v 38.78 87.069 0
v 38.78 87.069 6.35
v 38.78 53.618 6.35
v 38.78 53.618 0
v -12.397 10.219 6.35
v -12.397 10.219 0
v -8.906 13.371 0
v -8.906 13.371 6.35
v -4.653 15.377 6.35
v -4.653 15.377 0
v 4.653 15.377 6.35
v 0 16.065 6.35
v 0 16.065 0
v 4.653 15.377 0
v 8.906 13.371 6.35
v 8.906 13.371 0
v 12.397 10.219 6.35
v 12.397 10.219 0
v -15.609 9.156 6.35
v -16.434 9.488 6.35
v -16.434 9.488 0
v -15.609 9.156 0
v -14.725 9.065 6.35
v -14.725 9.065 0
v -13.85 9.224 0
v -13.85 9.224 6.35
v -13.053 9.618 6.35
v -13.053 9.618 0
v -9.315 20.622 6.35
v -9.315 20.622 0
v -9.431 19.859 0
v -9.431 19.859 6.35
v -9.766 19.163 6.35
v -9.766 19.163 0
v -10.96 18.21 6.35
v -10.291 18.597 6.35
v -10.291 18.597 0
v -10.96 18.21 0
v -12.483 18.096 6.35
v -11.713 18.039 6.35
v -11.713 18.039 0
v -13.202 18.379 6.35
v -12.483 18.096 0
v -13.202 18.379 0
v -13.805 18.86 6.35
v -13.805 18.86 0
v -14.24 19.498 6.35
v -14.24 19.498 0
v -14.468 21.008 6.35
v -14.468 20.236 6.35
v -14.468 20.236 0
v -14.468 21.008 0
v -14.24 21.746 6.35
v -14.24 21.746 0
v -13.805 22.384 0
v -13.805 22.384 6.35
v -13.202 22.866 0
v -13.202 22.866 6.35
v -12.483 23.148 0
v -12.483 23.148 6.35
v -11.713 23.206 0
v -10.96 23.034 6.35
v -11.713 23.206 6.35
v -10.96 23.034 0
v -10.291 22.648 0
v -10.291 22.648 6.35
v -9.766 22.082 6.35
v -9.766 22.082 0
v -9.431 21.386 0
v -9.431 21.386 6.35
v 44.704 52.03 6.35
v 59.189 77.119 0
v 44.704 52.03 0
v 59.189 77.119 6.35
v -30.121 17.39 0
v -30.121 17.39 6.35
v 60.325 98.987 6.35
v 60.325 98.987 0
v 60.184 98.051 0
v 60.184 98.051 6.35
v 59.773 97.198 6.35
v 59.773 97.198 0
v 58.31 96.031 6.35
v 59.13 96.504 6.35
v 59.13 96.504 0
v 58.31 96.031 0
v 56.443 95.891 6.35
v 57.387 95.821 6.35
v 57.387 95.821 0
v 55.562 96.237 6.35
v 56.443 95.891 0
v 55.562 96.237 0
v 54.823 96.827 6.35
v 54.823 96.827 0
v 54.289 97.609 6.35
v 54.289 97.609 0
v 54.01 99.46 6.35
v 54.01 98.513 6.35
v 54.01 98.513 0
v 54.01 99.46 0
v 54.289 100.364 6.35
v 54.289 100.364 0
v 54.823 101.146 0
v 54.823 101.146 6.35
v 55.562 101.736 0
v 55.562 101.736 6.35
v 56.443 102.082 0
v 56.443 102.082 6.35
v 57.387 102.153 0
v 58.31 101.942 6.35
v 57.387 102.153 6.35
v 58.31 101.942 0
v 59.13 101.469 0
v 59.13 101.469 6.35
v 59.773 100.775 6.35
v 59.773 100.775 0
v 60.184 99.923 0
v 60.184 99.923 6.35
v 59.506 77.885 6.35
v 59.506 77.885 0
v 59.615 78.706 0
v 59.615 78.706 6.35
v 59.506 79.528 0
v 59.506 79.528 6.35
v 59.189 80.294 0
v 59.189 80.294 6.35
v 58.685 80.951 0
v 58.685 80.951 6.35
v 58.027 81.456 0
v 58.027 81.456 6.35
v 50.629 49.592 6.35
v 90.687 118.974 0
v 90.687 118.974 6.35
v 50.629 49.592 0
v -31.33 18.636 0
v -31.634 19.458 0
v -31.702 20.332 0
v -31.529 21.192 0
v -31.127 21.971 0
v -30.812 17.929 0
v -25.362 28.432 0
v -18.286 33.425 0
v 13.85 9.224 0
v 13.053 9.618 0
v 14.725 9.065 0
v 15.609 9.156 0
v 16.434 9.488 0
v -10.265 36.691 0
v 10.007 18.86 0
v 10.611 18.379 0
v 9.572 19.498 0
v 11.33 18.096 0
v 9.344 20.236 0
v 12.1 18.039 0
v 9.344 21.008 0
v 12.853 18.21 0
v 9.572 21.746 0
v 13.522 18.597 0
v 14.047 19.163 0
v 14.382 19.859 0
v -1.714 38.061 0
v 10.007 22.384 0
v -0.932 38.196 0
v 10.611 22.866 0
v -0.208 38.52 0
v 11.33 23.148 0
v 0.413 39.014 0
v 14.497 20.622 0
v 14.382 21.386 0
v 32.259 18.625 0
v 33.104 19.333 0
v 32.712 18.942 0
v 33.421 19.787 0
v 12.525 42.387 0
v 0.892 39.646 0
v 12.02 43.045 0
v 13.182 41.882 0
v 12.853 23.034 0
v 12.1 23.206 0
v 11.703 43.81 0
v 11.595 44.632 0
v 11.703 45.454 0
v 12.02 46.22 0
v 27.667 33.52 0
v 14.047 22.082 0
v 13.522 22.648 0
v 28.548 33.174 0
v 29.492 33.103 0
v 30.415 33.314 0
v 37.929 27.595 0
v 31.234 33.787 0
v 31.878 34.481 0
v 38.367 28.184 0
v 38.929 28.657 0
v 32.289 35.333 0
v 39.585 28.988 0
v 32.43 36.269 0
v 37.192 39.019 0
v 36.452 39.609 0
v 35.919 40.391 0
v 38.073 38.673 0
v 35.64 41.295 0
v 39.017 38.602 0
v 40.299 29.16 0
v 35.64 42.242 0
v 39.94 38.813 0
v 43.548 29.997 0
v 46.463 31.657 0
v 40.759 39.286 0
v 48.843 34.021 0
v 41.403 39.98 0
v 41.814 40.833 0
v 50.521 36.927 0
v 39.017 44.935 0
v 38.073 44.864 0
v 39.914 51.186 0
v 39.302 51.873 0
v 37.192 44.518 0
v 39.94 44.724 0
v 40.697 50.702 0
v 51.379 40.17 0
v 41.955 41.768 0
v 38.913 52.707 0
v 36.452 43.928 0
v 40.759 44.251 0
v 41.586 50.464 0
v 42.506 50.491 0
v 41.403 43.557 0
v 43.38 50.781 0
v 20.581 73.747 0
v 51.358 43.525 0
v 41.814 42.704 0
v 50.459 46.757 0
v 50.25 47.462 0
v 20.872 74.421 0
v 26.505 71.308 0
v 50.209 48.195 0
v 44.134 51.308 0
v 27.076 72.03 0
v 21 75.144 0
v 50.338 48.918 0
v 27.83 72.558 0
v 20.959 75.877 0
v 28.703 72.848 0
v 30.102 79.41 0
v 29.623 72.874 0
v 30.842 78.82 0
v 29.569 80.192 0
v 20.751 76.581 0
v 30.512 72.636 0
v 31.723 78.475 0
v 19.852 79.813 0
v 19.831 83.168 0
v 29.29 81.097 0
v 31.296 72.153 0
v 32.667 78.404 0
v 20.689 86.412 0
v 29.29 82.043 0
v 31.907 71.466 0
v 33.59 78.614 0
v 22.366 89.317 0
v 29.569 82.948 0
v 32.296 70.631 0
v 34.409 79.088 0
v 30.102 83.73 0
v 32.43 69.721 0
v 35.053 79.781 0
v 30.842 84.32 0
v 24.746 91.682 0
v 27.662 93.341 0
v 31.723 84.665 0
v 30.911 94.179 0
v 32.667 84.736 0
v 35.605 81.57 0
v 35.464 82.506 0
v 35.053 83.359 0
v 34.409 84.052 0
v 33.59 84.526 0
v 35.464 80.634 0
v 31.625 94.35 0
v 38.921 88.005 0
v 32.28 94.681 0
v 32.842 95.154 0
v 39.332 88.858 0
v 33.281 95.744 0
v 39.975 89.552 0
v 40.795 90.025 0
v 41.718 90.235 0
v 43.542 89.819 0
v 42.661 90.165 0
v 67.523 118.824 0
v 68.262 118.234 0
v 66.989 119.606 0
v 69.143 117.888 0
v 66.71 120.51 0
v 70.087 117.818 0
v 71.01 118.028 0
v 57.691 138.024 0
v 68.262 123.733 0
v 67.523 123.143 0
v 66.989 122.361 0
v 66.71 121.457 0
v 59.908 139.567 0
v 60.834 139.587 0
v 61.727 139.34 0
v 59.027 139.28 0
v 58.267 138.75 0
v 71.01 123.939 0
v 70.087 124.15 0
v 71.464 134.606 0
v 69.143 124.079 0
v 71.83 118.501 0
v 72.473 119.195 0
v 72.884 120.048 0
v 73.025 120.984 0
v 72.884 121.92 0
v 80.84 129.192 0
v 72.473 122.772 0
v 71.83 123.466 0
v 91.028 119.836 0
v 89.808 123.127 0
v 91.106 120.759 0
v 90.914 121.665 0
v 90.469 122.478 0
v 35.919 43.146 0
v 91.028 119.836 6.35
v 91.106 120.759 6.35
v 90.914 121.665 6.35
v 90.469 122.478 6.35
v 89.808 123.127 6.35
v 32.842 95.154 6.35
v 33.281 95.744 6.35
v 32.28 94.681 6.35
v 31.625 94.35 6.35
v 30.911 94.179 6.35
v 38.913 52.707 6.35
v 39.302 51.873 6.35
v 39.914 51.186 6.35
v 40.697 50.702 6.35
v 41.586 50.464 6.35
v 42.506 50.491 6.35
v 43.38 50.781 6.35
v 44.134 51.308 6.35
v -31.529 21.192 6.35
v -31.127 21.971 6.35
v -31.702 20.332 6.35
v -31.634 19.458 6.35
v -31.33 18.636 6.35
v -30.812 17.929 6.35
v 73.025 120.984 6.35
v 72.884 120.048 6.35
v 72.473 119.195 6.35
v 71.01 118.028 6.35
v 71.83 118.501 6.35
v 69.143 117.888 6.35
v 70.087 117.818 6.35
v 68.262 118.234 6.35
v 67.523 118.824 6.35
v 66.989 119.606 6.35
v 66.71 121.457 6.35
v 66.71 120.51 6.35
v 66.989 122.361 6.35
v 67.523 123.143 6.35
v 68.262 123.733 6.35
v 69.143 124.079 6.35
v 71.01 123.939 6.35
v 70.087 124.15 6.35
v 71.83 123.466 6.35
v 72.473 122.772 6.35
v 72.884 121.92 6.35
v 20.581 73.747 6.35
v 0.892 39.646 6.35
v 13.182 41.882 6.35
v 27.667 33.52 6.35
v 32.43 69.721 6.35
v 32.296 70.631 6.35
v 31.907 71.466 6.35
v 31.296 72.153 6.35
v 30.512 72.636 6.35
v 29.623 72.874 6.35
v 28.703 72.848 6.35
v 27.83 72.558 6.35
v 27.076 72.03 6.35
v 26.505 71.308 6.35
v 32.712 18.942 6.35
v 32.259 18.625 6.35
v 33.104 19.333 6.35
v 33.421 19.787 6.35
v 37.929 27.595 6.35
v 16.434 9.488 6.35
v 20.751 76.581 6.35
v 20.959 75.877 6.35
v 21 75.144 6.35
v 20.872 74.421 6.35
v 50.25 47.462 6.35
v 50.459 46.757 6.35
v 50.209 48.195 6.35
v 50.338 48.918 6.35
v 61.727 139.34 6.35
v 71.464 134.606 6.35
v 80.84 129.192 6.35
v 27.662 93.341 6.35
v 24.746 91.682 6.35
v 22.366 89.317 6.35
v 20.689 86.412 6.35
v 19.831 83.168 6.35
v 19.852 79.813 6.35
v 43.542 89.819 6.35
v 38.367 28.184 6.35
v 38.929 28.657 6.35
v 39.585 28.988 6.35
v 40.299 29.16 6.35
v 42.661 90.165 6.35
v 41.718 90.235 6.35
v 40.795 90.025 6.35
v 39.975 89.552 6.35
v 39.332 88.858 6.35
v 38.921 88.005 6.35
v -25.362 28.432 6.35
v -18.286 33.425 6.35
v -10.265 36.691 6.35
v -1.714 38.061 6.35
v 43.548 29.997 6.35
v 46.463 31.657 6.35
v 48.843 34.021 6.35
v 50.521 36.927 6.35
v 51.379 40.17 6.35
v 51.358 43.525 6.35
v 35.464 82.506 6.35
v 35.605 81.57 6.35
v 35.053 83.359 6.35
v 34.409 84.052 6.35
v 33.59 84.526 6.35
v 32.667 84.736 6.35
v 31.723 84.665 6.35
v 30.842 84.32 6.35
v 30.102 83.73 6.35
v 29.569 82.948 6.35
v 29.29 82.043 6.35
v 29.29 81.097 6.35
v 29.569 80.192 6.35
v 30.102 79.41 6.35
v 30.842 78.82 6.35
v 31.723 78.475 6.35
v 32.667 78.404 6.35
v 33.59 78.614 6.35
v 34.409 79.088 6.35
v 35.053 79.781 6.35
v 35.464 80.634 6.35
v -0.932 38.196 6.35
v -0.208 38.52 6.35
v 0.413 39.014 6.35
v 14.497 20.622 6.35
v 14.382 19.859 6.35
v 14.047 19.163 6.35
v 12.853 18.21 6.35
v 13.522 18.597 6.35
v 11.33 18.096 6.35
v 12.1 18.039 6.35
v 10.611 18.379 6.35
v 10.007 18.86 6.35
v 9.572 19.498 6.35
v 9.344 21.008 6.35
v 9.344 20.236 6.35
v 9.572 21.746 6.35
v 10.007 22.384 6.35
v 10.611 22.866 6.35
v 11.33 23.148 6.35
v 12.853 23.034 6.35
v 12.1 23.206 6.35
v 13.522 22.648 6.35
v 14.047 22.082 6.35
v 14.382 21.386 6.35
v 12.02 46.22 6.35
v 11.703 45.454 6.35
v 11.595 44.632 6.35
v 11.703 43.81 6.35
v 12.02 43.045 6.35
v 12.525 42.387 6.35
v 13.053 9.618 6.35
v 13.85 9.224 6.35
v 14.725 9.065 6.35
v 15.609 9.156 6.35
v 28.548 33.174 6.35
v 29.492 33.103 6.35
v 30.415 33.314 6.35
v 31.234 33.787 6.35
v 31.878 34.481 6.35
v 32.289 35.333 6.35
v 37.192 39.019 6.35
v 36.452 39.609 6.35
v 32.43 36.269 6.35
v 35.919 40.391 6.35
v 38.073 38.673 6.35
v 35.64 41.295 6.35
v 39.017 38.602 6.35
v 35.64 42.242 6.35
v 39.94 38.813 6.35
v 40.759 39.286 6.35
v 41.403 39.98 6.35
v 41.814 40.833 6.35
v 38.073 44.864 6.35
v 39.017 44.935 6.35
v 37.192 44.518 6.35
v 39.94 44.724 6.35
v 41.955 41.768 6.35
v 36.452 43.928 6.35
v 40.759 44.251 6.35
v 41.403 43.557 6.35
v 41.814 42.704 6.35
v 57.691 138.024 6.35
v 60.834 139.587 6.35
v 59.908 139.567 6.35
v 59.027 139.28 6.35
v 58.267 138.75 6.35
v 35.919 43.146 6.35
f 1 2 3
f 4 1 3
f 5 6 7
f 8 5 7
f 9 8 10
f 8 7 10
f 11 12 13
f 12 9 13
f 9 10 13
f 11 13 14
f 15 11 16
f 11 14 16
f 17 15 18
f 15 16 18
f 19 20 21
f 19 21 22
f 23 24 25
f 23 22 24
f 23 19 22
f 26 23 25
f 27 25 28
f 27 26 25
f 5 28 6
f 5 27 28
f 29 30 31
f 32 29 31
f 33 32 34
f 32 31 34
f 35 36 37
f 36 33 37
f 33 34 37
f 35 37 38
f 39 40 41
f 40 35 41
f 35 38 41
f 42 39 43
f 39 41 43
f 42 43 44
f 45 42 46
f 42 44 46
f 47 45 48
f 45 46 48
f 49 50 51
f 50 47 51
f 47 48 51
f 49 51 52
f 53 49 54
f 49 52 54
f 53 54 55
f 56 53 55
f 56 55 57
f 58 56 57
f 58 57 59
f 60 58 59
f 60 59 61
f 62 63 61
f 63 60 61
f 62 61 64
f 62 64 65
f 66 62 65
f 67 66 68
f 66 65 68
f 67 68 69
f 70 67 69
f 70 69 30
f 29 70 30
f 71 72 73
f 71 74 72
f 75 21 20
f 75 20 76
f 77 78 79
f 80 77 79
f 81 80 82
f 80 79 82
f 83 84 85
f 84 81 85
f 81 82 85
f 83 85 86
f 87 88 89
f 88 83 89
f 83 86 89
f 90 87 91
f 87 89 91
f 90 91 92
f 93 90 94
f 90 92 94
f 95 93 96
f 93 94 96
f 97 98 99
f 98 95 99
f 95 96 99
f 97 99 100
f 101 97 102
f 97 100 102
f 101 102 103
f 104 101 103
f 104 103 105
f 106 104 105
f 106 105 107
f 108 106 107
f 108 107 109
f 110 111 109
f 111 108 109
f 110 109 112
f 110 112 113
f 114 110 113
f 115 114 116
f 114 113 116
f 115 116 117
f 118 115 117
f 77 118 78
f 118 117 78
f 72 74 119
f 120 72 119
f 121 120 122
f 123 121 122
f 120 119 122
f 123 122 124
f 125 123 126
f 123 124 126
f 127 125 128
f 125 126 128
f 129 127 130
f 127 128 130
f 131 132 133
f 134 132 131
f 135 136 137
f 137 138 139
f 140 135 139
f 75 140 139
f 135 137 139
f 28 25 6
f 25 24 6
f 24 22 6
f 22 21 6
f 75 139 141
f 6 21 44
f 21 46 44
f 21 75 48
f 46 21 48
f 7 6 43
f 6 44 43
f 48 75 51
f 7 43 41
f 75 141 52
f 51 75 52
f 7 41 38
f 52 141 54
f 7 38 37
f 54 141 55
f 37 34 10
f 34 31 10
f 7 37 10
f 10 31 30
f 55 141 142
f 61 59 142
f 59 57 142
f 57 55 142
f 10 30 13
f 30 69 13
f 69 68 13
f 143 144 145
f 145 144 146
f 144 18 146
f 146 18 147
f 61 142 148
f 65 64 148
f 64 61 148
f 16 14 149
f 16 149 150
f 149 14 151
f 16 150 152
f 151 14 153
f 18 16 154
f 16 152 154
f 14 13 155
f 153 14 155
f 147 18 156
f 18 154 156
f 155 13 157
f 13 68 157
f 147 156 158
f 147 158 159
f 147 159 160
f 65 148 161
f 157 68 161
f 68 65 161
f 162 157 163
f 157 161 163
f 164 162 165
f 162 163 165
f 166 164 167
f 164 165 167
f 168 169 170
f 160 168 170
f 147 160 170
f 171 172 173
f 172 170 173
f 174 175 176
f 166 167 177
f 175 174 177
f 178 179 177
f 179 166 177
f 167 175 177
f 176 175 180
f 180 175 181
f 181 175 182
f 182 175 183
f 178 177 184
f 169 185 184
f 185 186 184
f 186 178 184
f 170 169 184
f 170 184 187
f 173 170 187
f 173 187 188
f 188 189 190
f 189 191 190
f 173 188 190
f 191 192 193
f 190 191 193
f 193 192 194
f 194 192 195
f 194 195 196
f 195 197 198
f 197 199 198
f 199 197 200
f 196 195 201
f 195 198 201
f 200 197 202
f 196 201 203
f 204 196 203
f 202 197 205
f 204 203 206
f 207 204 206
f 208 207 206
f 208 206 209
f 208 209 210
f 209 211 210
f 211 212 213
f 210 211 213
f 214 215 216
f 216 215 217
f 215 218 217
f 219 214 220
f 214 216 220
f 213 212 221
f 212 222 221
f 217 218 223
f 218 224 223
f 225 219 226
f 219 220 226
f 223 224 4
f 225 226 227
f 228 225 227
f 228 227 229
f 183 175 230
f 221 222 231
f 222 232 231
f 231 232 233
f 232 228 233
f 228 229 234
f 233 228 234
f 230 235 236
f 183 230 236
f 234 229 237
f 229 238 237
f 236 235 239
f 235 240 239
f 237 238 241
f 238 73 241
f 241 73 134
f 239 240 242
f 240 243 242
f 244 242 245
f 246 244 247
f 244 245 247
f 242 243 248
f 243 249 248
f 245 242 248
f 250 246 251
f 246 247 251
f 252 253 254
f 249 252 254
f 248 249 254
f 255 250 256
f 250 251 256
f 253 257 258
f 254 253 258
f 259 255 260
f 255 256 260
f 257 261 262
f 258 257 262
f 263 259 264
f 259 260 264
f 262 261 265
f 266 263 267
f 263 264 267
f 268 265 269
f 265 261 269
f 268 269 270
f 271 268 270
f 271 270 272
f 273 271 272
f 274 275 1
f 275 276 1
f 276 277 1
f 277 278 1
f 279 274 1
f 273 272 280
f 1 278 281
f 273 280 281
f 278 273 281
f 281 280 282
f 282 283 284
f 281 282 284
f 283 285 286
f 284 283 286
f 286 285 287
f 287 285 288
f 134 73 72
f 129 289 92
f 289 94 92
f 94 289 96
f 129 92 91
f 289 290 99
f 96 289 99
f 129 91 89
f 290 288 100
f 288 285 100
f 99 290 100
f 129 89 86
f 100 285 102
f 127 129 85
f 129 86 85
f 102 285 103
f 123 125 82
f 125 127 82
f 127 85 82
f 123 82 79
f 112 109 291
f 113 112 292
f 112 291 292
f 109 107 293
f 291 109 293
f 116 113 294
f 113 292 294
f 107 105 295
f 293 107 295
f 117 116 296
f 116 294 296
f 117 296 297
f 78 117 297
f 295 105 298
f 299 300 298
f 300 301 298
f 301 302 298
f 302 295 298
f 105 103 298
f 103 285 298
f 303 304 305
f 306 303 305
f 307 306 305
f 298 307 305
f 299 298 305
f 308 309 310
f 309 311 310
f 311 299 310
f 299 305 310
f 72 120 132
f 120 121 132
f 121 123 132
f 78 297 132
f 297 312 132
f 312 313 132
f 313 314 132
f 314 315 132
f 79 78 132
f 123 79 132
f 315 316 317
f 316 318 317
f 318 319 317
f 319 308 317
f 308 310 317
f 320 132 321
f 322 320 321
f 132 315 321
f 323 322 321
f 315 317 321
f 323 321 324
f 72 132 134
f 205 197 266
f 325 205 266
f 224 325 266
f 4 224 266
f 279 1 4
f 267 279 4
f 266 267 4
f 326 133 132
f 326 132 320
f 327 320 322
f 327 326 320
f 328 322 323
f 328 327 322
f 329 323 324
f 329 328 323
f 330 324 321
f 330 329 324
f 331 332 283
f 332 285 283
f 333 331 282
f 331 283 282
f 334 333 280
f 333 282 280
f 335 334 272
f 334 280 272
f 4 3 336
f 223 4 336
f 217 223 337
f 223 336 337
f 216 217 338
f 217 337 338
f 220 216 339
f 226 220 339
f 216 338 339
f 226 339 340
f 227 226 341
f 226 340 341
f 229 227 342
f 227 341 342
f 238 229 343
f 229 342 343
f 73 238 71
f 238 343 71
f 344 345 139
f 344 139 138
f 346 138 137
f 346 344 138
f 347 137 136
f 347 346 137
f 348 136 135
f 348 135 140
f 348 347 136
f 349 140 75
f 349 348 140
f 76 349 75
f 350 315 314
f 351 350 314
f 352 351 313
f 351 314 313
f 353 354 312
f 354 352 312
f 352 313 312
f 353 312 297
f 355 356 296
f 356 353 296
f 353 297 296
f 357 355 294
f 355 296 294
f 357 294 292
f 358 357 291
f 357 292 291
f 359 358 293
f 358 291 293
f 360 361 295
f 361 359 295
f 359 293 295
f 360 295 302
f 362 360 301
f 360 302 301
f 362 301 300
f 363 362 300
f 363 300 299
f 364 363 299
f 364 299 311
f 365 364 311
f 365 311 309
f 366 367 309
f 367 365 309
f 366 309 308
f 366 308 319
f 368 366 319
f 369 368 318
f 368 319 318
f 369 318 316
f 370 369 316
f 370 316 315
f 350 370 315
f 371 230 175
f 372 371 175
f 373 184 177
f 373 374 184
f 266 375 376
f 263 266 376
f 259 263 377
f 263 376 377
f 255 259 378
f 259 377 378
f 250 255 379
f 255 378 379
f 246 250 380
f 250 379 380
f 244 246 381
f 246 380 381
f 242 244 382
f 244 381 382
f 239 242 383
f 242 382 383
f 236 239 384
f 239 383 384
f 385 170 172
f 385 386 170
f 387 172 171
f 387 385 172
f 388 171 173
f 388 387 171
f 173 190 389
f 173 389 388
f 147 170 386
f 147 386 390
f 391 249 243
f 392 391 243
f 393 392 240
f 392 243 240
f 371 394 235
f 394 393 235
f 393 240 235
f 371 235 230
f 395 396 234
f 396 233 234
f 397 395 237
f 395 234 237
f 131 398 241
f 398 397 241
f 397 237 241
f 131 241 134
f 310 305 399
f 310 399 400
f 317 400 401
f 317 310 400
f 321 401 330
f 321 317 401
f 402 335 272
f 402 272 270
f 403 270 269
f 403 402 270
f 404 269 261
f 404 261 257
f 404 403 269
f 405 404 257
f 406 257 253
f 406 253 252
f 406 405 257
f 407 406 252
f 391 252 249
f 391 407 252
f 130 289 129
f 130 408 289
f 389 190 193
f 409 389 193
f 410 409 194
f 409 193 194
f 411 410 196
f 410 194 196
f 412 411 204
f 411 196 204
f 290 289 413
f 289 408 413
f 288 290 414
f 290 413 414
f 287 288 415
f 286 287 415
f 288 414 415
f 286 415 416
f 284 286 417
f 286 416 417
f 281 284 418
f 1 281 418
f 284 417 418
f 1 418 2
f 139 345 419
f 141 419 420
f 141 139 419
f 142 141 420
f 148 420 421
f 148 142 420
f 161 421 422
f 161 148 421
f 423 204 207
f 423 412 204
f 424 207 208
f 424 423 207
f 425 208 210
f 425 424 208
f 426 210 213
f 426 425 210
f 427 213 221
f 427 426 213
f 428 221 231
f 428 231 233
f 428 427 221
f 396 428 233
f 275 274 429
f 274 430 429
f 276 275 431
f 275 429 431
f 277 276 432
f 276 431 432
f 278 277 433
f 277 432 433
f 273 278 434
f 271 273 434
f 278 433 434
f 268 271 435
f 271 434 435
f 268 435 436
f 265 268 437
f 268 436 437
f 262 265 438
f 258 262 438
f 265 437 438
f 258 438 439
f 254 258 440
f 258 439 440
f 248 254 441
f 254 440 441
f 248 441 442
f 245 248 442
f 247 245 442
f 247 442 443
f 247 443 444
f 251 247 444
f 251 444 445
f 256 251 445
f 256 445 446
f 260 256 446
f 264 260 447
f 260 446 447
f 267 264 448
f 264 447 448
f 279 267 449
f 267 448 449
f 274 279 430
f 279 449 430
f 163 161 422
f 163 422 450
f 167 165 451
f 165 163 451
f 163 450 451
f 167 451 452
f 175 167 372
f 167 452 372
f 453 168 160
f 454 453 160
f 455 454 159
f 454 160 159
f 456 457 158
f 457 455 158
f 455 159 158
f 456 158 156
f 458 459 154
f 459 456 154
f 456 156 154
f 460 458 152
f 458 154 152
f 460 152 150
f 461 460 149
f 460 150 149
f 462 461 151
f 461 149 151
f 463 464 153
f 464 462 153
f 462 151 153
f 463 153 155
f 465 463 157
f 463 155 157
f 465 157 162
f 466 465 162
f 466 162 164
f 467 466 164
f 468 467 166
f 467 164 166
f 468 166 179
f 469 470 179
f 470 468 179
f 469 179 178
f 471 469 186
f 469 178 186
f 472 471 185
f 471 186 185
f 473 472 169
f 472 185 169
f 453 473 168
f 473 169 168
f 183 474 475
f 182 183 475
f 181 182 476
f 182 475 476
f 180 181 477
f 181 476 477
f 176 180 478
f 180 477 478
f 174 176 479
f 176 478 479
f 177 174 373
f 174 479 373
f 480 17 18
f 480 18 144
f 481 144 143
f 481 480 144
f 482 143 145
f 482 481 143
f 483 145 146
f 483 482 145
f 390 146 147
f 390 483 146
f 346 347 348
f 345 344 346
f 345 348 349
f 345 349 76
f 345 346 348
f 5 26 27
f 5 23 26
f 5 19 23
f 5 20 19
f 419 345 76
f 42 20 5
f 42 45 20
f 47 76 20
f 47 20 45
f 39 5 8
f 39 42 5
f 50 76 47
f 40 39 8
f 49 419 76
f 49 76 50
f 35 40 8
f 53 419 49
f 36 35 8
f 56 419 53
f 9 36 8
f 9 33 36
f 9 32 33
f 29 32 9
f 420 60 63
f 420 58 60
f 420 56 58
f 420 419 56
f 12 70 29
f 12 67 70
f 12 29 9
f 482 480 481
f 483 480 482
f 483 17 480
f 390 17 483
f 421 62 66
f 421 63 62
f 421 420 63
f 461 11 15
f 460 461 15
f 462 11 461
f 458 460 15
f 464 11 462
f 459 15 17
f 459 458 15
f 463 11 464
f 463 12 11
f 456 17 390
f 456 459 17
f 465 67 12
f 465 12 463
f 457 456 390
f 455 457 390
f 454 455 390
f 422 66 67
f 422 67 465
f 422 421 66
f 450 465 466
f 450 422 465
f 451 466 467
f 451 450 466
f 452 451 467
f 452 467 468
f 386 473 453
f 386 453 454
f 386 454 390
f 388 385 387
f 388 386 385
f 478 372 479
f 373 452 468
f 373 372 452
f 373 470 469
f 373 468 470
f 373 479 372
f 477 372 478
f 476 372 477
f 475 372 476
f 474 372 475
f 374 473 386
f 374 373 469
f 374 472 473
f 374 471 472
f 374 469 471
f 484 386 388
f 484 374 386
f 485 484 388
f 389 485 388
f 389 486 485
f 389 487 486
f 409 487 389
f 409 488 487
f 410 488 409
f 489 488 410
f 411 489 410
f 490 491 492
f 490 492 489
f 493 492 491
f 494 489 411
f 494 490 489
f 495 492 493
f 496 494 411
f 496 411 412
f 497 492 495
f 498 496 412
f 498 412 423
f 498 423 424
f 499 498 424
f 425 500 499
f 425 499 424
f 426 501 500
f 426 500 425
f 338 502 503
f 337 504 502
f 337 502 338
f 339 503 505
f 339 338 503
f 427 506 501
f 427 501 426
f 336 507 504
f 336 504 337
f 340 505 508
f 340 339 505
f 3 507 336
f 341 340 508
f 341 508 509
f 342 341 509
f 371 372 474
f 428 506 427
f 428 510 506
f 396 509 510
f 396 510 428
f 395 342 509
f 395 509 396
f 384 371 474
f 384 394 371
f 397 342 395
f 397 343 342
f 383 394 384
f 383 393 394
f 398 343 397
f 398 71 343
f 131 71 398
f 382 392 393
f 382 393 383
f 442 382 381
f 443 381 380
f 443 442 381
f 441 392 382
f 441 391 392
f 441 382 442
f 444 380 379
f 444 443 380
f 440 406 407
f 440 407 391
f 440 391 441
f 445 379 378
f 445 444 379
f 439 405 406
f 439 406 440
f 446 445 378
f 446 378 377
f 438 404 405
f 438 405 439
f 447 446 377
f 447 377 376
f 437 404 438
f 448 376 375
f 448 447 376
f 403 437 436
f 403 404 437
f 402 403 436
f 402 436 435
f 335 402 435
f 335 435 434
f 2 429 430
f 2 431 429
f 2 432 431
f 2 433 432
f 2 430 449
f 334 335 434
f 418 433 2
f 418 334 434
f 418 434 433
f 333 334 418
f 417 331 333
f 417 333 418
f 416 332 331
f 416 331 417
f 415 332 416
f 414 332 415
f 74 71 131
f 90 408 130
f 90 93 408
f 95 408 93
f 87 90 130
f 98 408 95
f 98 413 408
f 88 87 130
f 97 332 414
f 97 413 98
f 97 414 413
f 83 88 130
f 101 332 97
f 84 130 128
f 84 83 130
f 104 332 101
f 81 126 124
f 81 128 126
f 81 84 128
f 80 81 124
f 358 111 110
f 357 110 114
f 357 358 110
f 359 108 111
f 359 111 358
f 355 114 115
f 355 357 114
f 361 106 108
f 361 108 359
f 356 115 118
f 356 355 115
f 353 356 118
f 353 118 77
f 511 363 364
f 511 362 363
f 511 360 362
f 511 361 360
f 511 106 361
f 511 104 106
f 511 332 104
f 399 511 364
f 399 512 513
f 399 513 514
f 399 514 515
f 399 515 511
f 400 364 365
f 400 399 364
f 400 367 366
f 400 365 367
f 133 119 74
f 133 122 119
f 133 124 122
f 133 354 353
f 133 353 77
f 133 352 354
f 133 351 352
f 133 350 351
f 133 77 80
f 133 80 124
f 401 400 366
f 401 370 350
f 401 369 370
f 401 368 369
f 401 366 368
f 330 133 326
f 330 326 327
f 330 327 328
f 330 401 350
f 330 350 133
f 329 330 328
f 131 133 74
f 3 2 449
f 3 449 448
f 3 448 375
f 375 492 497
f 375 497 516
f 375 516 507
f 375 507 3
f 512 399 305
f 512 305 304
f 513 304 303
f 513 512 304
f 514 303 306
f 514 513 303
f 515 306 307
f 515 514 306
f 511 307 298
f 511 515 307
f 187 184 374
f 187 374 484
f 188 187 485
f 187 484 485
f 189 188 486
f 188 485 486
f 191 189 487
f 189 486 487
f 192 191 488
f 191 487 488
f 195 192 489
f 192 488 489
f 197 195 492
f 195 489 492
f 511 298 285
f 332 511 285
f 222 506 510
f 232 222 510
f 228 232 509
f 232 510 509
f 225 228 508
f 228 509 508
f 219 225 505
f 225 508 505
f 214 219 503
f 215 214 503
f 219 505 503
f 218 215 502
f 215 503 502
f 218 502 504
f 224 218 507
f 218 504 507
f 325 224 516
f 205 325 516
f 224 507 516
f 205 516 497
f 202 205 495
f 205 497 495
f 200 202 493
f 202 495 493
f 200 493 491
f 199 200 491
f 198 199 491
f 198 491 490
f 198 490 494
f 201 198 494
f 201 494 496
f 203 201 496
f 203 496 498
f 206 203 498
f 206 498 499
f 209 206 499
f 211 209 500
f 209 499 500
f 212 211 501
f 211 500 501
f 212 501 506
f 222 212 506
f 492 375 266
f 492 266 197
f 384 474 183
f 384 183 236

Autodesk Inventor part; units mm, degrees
ref_plane "YZ Plane" through (0, 0, 0) normal (1, 0, 0) x (0, 1, 0)
ref_plane "XZ Plane" through (0, 0, 0) normal (0, 1, 0) x (-1, 0, 0)
ref_plane "XY Plane" through (0, 0, 0) normal (0, 0, 1) x (1, 0, 0)
sketch "Sketch1" plane through (0, 0, 0) normal (0, 0, 1) x (1, 0, 0)
  circle A0 centre (11.9062, -20.6222) radius 2.5908 construction
  circle A1 centre (-23.8125, 0) radius 2.5908 construction
  circle A2 centre (11.9063, 20.6222) radius 2.5908 projected
  circle A3 centre (23.8125, 0) radius 2.5908 construction
  circle A4 centre (-11.9062, 20.6222) radius 2.5908 projected
  circle A5 centre (-11.9062, -20.6222) radius 2.5908 construction
  circle A6 centre (0, 0) radius 14.478 construction
  circle A7 centre (57.15, 98.9867) radius 3.175 projected
  circle A8 centre (69.85, 120.9837) radius 3.175 projected
  circle A9 centre (98.9867, 57.15) radius 3.175 construction
  circle A10 centre (120.9837, 69.85) radius 3.175 construction
  circle A11 centre (114.3, 0) radius 3.175 construction
  circle A12 centre (139.7, 0) radius 3.175 construction
  circle A13 centre (98.9867, -57.15) radius 3.175 construction
  circle A14 centre (120.9837, -69.85) radius 3.175 construction
  circle A15 centre (57.15, -98.9867) radius 3.175 construction
  circle A16 centre (69.85, -120.9837) radius 3.175 construction
  circle A17 centre (0, -114.3) radius 3.175 construction
  circle A18 centre (0, -139.7) radius 3.175 construction
  circle A19 centre (-57.15, -98.9867) radius 3.175 construction
  circle A20 centre (-69.85, -120.9837) radius 3.175 construction
  circle A21 centre (-98.9867, -57.15) radius 3.175 construction
  circle A22 centre (-120.9837, -69.85) radius 3.175 construction
  circle A23 centre (-114.3, 0) radius 3.175 construction
  circle A24 centre (-139.7, 0) radius 3.175 construction
  circle A25 centre (-98.9867, 57.15) radius 3.175 construction
  circle A26 centre (-120.9837, 69.85) radius 3.175 construction
  circle A27 centre (-57.15, 98.9867) radius 3.175 construction
  circle A28 centre (-69.85, 120.9837) radius 3.175 construction
  circle A29 centre (0, 114.3) radius 3.175 construction
  circle A30 centre (0, 139.7) radius 3.175 construction
  circle A31 centre (0, 0) radius 152.4 construction
  arc A32 (92.1001, 121.4221) -> (59.1046, 140.4721) centre (0, 0) ccw
  line L0 (59.1046, 140.4721) -> (0, 38.1)
  line L1 (92.1001, 121.4221) -> (32.9956, 19.05)
  line L2 (69.85, 120.9837) -> (0, 0) construction
  line L3 (0, 0) -> (-12.5383, 7.239) construction
  line L4 (0, -263.7526) -> (0, 221.7588) construction
  arc A33 (0, 38.1) -> (-32.9956, 19.05) centre (0, 0) ccw
  line L5 (12.5383, 7.239) -> (0, 0) construction
  arc A34 (13.9131, 8.0328) -> (-13.9131, 8.0328) centre (0, 0) ccw
  line L6 (-13.9131, 8.0328) -> (-32.9956, 19.05)
  line L7 (32.9956, 19.05) -> (13.9131, 8.0328)
  dimension "d1" = 38.1
  dimension "d19" = 1.5875
extrude "Extrusion1" add sketch "Sketch1" along normal blind 6.35
sketch "Sketch2" plane through (0, 0, 6.35) normal (0, 0, 1) x (1, 0, 0)
  line L0 (12.0202, 46.2196) -> (26.5051, 71.3083)
  line L1 (32.4298, 69.7208) -> (32.4298, 36.2693)
  line L2 (27.6673, 33.5196) -> (13.1824, 41.8825)
  line L3 (59.1046, 140.4721) -> (0, 38.1) construction
  arc A0 (0, 38.1) -> (-32.9956, 19.05) centre (0, 0) ccw construction
  line L4 (38.7798, 87.0693) -> (38.7798, 53.6178)
  line L5 (43.5423, 89.8189) -> (58.0272, 81.456)
  line L6 (59.1893, 77.1189) -> (44.7044, 52.0303)
  line L7 (32.9956, 19.05) -> (92.1001, 121.4221) construction
  circle A1 centre (11.9063, 20.6222) radius 2.5908 construction
  arc A2 (12.0202, 46.2196) -> (13.1824, 41.8825) centre (14.7699, 44.6321) ccw
  arc A3 (32.4298, 69.7208) -> (26.5051, 71.3083) centre (29.2548, 69.7208) ccw
  arc A4 (27.6673, 33.5196) -> (32.4298, 36.2693) centre (29.2548, 36.2693) ccw
  arc A5 (38.7798, 53.6178) -> (44.7044, 52.0303) centre (41.9548, 53.6178) ccw
  arc A6 (43.5423, 89.8189) -> (38.7798, 87.0693) centre (41.9548, 87.0693) ccw
  arc A7 (59.1893, 77.1189) -> (58.0272, 81.456) centre (56.4397, 78.7064) ccw
  point P0 (0, 0)
  point P1 (32.4298, 30.77)
  point P2 (38.7798, 92.5685)
  dimension "d4" = 6.35
  dimension "d5" = 6.35
  dimension "d6" = 6.35
  dimension "d7" = 19.05
  dimension "d8" = 3.175
extrude "Extrusion2" cut sketch "Sketch2" against normal blind 6.35
sketch "Sketch3" plane through (0, 0, 6.35) normal (0, 0, 1) x (1, 0, 0)
  circle A0 centre (32.4298, 81.57) radius 3.175
  line L0 (12.0202, 46.2196) -> (26.5051, 71.3083) construction
  circle A1 centre (38.7798, 41.7685) radius 3.175
  line L1 (59.1893, 77.1189) -> (44.7044, 52.0303) construction
  line L2 (32.4298, 69.7208) -> (32.4298, 36.2693) construction
  line L3 (38.7798, 53.6178) -> (38.7798, 87.0693) construction
  point P0 (0, 0)
  dimension "d12" = 6.35
extrude "Extrusion3" cut sketch "Sketch3" against normal through all
sketch "Sketch4" plane through (0, 0, 6.35) normal (0, 0, 1) x (1, 0, 0)
  arc A0 (32.4298, 94.27) -> (21.4313, 75.22) centre (32.4298, 81.57) ccw
  circle A1 centre (32.4298, 81.57) radius 3.175 construction
  line L0 (32.4298, 94.27) -> (21.4313, 75.22)
  line L1 (59.1046, 140.4721) -> (0, 38.1) construction
  arc A2 (38.7798, 29.0685) -> (49.7783, 48.1185) centre (38.7798, 41.7685) ccw
  line L2 (49.7783, 48.1185) -> (38.7798, 29.0685)
  circle A3 centre (38.7798, 41.7685) radius 3.175 construction
  line L3 (32.9956, 19.05) -> (92.1001, 121.4221) construction
  point P0 (0, 0)
  point P1 (57.6913, 138.0243)
  point P2 (0.8924, 39.6457)
  point P3 (33.4209, 19.7868)
  point P4 (90.6869, 118.9743)
  dimension "d15" = 12.7
extrude "Extrusion4" add sketch "Sketch4" against normal blind 6.35
fillet "Fillet2" radius 3.175 11 edges at (-32.9956, 19.05, 3.175) (0, 38.1, 3.175) (32.4298, 94.27, 3.175) (21.4313, 75.22, 3.175) (59.1046, 140.4721, 3.175) (92.1001, 121.4221, 3.175) (49.7783, 48.1185, 3.175) (38.7798, 29.0685, 3.175) (32.9956, 19.05, 3.175) (-13.9131, 8.0328, 3.175) (13.9131, 8.0328, 3.175)
equation "\"d5\" = d4"
equation "\"d6\" = d4"
properties part number "Doubler" material "Aluminum 6061"
